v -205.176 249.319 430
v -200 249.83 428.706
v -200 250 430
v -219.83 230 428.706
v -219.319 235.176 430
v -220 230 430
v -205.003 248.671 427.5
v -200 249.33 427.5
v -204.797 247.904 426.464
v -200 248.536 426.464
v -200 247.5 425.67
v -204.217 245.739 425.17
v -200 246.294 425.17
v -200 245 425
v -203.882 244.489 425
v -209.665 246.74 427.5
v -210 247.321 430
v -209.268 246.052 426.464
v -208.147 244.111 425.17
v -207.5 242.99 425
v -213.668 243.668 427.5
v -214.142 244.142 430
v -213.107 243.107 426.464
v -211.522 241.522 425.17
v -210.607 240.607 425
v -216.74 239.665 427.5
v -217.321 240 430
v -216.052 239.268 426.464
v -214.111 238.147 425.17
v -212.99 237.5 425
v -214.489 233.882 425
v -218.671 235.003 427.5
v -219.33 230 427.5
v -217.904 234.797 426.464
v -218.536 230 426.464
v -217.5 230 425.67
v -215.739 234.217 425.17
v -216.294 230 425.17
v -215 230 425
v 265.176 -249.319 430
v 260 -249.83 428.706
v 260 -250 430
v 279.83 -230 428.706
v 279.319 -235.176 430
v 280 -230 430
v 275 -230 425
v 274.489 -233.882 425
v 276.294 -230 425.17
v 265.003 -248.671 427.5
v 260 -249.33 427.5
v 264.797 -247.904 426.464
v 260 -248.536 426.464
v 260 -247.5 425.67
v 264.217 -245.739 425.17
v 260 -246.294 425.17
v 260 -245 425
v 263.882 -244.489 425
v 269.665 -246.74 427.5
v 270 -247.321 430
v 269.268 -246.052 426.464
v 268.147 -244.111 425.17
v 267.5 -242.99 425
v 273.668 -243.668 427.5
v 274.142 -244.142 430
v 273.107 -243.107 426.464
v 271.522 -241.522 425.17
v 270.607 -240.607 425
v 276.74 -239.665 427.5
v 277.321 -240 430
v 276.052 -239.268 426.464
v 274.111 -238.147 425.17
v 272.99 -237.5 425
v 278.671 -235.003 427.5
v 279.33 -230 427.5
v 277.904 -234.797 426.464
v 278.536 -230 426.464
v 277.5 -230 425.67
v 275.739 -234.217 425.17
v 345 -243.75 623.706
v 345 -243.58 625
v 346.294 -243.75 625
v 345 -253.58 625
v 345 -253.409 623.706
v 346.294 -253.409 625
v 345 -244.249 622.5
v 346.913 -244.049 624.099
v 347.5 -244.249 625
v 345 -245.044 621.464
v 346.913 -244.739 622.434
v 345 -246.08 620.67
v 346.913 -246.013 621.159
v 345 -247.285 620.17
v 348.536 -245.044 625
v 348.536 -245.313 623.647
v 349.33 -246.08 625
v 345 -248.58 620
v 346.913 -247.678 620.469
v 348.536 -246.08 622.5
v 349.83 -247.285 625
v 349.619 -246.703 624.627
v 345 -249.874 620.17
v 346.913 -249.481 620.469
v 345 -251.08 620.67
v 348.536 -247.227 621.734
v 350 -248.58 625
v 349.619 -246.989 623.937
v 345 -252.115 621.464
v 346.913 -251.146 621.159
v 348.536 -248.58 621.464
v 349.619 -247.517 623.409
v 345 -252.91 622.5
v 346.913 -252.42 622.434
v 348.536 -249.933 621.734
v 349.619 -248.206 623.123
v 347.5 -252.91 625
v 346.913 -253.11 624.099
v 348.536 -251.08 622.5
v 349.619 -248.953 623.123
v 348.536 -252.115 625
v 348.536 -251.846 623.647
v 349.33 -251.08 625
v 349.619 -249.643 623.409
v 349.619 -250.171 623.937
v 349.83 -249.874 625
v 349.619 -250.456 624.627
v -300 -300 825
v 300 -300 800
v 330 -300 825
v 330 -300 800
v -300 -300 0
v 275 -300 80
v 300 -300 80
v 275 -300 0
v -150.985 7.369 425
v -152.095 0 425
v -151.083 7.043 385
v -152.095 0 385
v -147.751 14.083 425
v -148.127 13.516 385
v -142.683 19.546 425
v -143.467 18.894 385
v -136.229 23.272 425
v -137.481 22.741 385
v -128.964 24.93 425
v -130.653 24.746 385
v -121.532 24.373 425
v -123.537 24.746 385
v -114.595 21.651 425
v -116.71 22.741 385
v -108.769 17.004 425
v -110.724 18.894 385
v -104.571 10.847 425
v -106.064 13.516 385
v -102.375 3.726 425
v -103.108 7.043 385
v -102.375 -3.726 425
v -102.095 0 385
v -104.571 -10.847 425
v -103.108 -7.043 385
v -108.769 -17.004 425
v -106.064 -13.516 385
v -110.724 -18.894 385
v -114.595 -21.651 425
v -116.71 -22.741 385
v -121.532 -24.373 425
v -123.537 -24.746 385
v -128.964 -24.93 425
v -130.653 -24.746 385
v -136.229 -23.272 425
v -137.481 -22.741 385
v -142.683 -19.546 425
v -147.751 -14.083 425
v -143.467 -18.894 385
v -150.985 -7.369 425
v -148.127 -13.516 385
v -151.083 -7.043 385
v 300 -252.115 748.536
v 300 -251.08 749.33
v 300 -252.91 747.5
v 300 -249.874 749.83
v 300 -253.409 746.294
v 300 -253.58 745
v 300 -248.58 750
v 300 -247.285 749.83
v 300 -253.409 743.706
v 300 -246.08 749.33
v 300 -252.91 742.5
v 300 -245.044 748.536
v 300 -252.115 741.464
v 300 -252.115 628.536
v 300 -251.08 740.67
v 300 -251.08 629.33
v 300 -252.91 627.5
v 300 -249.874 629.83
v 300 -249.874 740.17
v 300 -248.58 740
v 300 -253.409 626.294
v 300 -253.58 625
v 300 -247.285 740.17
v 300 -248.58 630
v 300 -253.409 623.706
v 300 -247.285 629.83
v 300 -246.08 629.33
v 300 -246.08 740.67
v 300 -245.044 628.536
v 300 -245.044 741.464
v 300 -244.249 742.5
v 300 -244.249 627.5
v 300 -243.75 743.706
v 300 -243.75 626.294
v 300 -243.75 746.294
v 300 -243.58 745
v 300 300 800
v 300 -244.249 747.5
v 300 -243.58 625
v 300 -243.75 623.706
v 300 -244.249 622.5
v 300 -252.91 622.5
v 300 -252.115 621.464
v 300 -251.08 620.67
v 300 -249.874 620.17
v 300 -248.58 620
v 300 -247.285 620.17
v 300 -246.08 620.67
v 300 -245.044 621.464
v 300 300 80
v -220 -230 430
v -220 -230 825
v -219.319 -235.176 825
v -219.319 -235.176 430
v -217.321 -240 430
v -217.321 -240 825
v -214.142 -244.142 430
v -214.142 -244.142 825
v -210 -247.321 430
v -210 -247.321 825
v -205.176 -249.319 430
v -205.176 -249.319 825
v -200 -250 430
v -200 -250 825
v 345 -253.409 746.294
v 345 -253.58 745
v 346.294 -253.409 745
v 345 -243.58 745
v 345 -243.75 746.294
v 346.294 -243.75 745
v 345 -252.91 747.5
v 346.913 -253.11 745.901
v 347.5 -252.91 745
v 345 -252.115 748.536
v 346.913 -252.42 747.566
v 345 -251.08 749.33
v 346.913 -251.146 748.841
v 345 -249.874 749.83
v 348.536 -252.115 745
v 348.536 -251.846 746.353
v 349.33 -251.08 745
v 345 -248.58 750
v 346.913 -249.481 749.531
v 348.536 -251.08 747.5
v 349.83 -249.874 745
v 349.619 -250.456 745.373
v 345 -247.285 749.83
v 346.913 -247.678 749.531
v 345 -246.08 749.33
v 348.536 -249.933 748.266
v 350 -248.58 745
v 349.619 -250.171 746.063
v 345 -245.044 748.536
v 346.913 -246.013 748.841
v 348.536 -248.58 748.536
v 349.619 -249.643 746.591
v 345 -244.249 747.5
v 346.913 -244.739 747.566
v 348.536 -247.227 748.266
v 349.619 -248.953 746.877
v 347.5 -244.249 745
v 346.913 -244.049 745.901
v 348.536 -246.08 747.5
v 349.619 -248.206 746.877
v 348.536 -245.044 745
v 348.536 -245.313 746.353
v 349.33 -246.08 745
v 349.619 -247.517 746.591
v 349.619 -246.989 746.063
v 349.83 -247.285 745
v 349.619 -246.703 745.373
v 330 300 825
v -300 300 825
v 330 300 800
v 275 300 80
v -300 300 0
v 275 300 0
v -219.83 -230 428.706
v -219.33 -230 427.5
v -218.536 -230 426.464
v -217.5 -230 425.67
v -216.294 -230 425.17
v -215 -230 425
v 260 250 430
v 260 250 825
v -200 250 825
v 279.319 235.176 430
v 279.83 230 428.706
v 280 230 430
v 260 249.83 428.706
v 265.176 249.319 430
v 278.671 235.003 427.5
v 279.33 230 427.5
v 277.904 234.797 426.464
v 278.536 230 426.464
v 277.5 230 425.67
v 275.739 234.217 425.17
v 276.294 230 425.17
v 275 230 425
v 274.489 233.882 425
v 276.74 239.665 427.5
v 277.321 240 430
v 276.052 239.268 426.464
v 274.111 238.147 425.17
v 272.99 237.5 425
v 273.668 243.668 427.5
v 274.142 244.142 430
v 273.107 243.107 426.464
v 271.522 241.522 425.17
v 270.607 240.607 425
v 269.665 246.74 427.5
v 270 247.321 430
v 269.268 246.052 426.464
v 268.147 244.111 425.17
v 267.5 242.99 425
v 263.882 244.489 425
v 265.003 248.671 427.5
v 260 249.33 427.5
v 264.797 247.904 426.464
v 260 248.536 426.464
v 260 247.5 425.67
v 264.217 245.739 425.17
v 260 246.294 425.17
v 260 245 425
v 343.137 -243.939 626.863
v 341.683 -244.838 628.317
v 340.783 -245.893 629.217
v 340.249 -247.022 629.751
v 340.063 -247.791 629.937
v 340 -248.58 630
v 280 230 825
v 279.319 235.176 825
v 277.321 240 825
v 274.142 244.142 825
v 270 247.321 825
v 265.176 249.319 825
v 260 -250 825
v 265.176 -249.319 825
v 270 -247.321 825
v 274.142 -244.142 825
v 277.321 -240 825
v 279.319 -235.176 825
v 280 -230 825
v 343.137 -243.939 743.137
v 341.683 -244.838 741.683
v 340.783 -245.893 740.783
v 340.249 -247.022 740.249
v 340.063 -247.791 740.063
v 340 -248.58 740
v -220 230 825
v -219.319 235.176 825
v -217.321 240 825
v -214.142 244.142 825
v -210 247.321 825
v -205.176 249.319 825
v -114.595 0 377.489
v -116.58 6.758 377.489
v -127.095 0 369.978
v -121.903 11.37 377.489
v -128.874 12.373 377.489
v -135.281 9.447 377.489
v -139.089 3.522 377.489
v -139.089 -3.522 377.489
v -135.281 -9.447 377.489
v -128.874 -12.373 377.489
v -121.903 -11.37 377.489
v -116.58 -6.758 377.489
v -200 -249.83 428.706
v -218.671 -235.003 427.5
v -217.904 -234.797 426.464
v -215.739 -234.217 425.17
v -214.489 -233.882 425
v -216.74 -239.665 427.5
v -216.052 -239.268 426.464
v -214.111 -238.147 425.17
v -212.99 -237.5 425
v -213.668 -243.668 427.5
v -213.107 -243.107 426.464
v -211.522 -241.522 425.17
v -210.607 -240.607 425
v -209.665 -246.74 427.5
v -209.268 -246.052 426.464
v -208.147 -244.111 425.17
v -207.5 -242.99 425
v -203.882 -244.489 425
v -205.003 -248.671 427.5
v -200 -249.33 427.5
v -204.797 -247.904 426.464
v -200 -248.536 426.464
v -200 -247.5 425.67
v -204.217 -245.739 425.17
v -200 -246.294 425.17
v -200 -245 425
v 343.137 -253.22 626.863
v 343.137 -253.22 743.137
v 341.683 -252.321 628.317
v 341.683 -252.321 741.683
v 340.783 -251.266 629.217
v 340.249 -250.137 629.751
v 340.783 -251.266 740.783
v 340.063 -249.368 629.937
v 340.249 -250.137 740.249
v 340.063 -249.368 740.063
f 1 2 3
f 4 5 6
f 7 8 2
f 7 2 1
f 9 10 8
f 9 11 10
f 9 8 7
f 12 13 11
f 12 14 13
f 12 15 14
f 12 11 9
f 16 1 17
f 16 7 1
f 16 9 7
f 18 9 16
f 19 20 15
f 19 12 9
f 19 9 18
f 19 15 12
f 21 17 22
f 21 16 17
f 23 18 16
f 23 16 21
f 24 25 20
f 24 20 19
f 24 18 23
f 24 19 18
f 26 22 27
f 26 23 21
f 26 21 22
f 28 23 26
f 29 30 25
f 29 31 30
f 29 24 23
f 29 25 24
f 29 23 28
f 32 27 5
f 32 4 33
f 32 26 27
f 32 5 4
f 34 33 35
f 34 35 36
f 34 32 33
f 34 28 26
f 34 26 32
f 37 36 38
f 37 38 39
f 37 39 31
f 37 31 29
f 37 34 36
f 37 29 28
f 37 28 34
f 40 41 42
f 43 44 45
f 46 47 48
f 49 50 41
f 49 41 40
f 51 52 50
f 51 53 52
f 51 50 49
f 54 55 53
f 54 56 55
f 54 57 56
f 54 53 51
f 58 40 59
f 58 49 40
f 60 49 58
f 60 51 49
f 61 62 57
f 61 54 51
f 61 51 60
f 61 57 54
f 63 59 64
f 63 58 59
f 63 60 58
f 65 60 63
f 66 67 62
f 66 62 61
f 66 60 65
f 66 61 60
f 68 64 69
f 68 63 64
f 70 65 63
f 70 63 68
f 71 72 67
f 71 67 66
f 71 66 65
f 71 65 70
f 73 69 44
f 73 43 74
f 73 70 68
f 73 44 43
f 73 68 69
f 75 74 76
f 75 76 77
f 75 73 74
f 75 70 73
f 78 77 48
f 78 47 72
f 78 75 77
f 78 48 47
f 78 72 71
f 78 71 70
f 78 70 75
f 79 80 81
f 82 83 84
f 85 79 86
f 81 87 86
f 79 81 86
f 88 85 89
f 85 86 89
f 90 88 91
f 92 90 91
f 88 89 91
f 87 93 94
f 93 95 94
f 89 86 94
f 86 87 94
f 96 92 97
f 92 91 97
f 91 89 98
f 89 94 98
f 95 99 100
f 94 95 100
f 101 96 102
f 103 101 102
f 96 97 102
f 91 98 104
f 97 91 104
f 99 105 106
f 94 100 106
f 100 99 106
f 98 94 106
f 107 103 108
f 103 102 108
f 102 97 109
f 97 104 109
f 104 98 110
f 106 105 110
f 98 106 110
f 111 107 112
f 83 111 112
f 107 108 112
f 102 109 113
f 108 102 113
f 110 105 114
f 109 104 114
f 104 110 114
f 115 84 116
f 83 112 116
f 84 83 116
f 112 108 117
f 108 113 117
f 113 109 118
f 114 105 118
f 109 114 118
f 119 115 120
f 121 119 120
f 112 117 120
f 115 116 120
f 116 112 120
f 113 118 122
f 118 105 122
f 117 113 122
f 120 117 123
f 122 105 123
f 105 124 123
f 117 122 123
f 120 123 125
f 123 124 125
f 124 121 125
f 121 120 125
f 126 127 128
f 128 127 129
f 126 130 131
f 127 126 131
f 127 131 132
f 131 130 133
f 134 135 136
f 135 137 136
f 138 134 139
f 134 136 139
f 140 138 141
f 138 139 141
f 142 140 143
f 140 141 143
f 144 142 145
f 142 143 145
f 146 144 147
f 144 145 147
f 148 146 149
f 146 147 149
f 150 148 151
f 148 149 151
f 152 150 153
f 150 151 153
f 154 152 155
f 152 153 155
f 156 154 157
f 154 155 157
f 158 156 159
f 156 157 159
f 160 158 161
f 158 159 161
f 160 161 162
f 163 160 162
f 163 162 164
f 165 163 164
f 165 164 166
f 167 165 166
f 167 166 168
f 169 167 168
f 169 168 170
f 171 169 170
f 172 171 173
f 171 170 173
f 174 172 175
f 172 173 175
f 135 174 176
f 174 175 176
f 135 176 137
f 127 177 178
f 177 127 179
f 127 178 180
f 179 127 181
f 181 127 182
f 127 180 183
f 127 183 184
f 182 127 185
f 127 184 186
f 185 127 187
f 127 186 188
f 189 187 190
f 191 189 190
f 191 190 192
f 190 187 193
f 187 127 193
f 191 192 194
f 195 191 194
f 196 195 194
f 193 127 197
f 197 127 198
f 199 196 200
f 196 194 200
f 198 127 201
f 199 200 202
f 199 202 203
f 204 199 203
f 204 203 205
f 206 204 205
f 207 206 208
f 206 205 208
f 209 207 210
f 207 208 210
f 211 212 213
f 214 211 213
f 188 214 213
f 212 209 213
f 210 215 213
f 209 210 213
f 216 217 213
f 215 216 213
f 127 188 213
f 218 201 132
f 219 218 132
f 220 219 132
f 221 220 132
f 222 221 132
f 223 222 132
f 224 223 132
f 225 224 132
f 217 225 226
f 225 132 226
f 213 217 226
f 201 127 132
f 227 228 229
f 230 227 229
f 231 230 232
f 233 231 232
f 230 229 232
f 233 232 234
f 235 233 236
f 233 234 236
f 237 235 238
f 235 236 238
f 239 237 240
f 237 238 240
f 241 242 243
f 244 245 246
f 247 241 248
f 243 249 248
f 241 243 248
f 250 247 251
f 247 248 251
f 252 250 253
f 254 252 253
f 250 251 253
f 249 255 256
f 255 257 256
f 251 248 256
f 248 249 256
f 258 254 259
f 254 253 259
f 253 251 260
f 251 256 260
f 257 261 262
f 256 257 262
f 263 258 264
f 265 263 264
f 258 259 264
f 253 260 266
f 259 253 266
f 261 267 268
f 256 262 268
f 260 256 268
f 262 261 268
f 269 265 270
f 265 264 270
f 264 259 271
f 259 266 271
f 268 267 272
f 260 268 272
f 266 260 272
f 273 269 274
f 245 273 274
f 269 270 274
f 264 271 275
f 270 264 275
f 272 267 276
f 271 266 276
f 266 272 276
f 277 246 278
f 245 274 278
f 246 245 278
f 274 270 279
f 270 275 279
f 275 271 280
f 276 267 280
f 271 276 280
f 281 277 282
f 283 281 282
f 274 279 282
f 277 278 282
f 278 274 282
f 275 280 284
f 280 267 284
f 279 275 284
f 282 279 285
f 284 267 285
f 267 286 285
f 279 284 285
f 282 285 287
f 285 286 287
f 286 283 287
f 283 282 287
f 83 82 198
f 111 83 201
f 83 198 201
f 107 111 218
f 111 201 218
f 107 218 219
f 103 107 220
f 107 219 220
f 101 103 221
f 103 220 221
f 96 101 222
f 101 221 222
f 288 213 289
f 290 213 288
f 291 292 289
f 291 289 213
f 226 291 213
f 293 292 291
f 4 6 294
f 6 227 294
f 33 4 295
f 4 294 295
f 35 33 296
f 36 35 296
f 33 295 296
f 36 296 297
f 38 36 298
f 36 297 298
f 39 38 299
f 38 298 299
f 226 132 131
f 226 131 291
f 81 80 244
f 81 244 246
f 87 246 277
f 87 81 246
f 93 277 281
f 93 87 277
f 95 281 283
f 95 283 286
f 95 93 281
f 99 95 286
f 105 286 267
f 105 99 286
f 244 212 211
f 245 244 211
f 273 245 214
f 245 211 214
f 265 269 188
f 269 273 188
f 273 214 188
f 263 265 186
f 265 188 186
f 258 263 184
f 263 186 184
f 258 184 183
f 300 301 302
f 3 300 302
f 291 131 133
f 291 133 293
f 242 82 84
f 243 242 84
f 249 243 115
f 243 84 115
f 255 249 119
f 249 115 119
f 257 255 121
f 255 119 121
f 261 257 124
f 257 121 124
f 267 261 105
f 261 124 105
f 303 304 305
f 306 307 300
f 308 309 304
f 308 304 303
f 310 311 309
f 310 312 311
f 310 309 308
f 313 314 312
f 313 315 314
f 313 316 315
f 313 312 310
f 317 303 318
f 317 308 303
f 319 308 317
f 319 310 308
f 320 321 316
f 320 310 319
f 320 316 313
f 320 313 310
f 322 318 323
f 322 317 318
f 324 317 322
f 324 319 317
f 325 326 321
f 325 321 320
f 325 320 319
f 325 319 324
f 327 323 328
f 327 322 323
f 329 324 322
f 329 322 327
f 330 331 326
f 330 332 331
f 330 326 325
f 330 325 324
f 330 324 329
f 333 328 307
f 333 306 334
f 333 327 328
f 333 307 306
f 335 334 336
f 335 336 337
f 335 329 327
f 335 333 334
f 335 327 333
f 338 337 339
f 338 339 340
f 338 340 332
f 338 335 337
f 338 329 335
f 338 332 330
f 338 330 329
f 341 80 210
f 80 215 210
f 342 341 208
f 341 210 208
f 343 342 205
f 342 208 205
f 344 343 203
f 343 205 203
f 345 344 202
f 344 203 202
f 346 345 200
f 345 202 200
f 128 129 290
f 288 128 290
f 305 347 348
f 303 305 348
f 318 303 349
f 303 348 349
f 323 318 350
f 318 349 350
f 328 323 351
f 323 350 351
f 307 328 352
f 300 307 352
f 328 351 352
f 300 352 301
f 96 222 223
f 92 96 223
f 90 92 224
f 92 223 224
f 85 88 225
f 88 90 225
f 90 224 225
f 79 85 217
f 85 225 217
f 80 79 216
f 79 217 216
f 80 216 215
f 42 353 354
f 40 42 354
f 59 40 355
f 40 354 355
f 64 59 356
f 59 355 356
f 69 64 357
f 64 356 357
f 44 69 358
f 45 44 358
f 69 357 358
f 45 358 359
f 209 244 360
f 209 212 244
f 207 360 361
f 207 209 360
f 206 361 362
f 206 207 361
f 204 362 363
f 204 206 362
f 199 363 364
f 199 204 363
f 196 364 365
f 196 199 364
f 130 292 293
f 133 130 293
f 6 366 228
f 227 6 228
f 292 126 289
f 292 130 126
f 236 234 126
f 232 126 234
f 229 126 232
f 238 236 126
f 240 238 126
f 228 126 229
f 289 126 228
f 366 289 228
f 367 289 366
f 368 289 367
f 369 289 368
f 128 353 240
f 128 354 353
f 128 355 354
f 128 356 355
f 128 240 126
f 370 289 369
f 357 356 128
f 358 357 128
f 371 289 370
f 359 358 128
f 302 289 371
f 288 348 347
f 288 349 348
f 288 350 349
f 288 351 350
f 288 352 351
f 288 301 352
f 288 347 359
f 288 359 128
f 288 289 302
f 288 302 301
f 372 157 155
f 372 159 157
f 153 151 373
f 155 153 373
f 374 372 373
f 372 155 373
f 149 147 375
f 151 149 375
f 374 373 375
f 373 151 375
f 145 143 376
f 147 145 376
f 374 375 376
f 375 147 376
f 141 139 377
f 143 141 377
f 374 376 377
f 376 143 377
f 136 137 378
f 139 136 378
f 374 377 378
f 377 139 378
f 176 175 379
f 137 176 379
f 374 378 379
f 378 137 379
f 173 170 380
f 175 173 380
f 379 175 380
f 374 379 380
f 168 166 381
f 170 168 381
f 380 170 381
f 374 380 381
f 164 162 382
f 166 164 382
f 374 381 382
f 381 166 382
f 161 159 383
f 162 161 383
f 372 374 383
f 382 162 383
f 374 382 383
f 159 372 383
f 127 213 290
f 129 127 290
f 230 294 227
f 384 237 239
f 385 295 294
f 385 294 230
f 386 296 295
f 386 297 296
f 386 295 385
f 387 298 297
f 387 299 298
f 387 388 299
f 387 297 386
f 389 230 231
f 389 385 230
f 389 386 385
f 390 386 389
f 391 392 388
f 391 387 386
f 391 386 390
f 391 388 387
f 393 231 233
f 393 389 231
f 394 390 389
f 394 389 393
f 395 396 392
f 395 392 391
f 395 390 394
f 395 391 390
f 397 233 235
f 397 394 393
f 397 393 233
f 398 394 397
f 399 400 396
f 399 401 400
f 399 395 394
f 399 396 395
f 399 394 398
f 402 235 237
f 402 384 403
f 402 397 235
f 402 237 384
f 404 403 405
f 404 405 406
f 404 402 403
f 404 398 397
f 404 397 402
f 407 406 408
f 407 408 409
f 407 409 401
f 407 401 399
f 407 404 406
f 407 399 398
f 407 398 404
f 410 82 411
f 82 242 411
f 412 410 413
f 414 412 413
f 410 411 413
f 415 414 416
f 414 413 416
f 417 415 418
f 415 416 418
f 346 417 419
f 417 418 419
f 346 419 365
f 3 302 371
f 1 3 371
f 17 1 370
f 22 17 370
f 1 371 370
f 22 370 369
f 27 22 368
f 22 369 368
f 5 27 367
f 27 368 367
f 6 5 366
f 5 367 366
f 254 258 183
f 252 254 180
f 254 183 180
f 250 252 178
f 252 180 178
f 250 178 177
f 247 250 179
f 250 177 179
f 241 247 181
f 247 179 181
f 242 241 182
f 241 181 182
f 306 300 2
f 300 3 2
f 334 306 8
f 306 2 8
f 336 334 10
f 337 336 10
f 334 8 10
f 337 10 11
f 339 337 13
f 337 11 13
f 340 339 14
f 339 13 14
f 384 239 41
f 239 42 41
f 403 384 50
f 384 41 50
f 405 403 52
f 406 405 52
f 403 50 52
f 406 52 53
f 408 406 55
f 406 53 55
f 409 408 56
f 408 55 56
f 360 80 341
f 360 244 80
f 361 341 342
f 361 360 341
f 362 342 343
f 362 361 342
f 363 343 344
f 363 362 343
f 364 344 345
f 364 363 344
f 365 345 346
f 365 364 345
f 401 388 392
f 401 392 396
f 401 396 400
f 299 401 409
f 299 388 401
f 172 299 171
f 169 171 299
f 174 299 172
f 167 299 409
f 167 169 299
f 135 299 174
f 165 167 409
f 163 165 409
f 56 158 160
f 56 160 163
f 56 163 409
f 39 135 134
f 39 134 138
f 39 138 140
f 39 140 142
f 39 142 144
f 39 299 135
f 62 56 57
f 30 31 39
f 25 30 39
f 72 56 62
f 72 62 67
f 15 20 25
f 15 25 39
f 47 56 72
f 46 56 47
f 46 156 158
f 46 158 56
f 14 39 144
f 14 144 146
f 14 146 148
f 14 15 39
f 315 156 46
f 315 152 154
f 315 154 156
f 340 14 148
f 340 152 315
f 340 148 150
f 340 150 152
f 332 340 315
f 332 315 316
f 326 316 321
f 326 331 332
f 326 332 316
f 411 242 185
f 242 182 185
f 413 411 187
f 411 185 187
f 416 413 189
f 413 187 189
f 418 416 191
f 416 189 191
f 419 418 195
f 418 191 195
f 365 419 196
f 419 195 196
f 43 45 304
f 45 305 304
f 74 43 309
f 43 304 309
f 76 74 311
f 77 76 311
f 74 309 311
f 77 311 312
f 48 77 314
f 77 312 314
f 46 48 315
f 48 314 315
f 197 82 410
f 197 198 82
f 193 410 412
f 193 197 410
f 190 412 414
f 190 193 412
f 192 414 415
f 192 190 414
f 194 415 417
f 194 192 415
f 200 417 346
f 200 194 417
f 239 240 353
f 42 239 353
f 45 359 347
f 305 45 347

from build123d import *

# Parameters (mm, degrees)
F0_W        = 600
F0_H        = 600
F1_DEPTH    = 800
F2_W        = 600
F2_H        = 80
F3_DEPTH    = 25
F5_DEPTH    = 50
F6_T1_DEPTH = 120
F6_T4_ANGLE = 180
F6_T6_ANGLE = 180
F7_W        = 40
F7_H        = 110
F8_DEPTH    = 25
F9_R        = 4.99999
F10_W       = 630
F10_H       = 600
F11_DEPTH   = 25
F13_DEPTH   = 400
F14_R       = 5
F16_D       = 50
F16_DEPTH   = 40
F16_TIP     = 15.0215154757


# Not quite as in the source:
# - a fillet or chamfer that OpenCascade refuses, or shapes differently, is made with other operations: its cross-section is extruded or revolved along the edge and cut away or added
# - a fillet or chamfer is up to 0.001 mm smaller than in the source, because OpenCascade refuses the exact size


with BuildPart() as f1:
    # F0 (on Top) → F1 (new body)
    with BuildSketch(Plane.XY):
        Rectangle(F0_W, F0_H)
    extrude(amount=F1_DEPTH)

    # F2 (on face) → F3 (cut)
    with BuildSketch(Plane.YZ.offset(300)):
        with Locations((0, 40)):
            Rectangle(F2_W, F2_H)
    extrude(amount=-F3_DEPTH, mode=Mode.SUBTRACT)

    # F4 (on face) → F5 (join)
    with BuildSketch(Plane.YZ.offset(300)):
        with BuildLine():
            ThreePointArc((-248.5795542598, 750), (-252.1150881657, 748.5355339059), (-253.5795542598, 745))
            Line((-253.5795542598, 745), (-253.5795542598, 625))
            ThreePointArc((-253.5795542598, 625), (-252.1150881657, 621.4644660941), (-248.5795542598, 620))
            ThreePointArc((-248.5795542598, 620), (-245.0440203538, 621.4644660941), (-243.5795542598, 625))
            Line((-243.5795542598, 625), (-243.5795542598, 745))
            ThreePointArc((-243.5795542598, 745), (-245.0440203538, 748.5355339059), (-248.5795542598, 750))
        make_face()
    extrude(amount=F5_DEPTH)

    # F6: fillet of radius 5 on 4 edges, made by hand

    # F6_s2 → F6_t1 (cut)
    with BuildSketch(Plane.XY.offset(625)):
        with BuildLine():
            ThreePointArc((345, -253.5795542598), (348.5355339059, -252.1150881657), (350, -248.5795542598))
            Line((350, -248.5795542598), (350, -253.5795542598))
            Line((350, -253.5795542598), (345, -253.5795542598))
        make_face()
        with BuildLine():
            ThreePointArc((345, -243.5795542598), (348.5355339059, -245.0440203538), (350, -248.5795542598))
            Line((350, -248.5795542598), (350, -243.5795542598))
            Line((350, -243.5795542598), (345, -243.5795542598))
        make_face()
    extrude(amount=F6_T1_DEPTH, mode=Mode.SUBTRACT)

    # F6_s3 → F6_t4 (revolve, cut)
    with BuildSketch(Plane.XY.offset(745)):
        with BuildLine():
            ThreePointArc((345, -253.5795542598), (348.5355339059, -252.1150881657), (350, -248.5795542598))
            Line((350, -248.5795542598), (350, -253.5795542598))
            Line((350, -253.5795542598), (345, -253.5795542598))
        make_face()
    revolve(axis=Axis((350, -248.5795542598, 745), (-1, 0, 0)), revolution_arc=F6_T4_ANGLE, mode=Mode.SUBTRACT)

    # F6_s5 → F6_t6 (revolve, cut)
    with BuildSketch(Plane.XY.offset(625)):
        with BuildLine():
            ThreePointArc((345, -243.5795542598), (348.5355339059, -245.0440203538), (350, -248.5795542598))
            Line((350, -248.5795542598), (350, -243.5795542598))
            Line((350, -243.5795542598), (345, -243.5795542598))
        make_face()
    revolve(axis=Axis((350, -248.5795542598, 625), (-1, 0, 0)), revolution_arc=F6_T6_ANGLE, mode=Mode.SUBTRACT)

    # F7 (on face) → F8 (cut)
    with BuildSketch(Plane(origin=(0, -243.5795542598, 0), x_dir=(-1, 0, 0), z_dir=(0, 1, 0))):
        with Locations((-320, 685)):
            Rectangle(F7_W, F7_H)
    extrude(amount=-F8_DEPTH, mode=Mode.SUBTRACT)

    # F9 (radius 5 in the source; OpenCascade refuses exactly that, so slightly less here)
    f9_edges = [f1.edges().sort_by_distance(p)[0] for p in [
        (320, -243.579554, 740),
        (340, -243.579554, 685),
        (320, -243.579554, 630),
        (320, -253.579554, 740),
        (340, -253.579554, 685),
        (320, -253.579554, 630),
    ]]
    fillet(f9_edges, radius=F9_R)

    # F10 (on face) → F11 (join)
    with BuildSketch(Plane.XY.offset(800)):
        with Locations((15, 0)):
            Rectangle(F10_W, F10_H)
    extrude(amount=F11_DEPTH)

    # F12 (on face) → F13 (cut)
    with BuildSketch(Plane.XY.offset(825)):
        with BuildLine():
            Line((-200, -250), (260, -250))
            ThreePointArc((260, -250), (274.1421356237, -244.1421356237), (280, -230))
            Line((280, -230), (280, 230))
            ThreePointArc((280, 230), (274.1421356237, 244.1421356237), (260, 250))
            Line((260, 250), (-200, 250))
            ThreePointArc((-200, 250), (-214.1421356237, 244.1421356237), (-220, 230))
            Line((-220, 230), (-220, -230))
            ThreePointArc((-220, -230), (-214.1421356237, -244.1421356237), (-200, -250))
        make_face()
    extrude(amount=-F13_DEPTH, mode=Mode.SUBTRACT)

    # F14
    f14_edges = [f1.edges().sort_by_distance(p)[0] for p in [
        (30, 250, 425),
        (-214.142136, 244.142136, 425),
        (-220, 0, 425),
        (30, -250, 425),
        (274.142136, -244.142136, 425),
        (280, 0, 425),
        (274.142136, 244.142136, 425),
        (-214.142136, -244.142136, 425),
    ]]
    fillet(f14_edges, radius=F14_R)

    # F16
    with Locations(Plane.XY.offset(425)):
        with Locations((-127.0953565836, 0)):
            Hole(F16_D / 2, depth=F16_DEPTH)
            with Locations((0, 0, -(F16_DEPTH + F16_TIP / 2))):  # 118° drill point
                Cone(0, F16_D / 2, F16_TIP, mode=Mode.SUBTRACT)


solid = f1.part
